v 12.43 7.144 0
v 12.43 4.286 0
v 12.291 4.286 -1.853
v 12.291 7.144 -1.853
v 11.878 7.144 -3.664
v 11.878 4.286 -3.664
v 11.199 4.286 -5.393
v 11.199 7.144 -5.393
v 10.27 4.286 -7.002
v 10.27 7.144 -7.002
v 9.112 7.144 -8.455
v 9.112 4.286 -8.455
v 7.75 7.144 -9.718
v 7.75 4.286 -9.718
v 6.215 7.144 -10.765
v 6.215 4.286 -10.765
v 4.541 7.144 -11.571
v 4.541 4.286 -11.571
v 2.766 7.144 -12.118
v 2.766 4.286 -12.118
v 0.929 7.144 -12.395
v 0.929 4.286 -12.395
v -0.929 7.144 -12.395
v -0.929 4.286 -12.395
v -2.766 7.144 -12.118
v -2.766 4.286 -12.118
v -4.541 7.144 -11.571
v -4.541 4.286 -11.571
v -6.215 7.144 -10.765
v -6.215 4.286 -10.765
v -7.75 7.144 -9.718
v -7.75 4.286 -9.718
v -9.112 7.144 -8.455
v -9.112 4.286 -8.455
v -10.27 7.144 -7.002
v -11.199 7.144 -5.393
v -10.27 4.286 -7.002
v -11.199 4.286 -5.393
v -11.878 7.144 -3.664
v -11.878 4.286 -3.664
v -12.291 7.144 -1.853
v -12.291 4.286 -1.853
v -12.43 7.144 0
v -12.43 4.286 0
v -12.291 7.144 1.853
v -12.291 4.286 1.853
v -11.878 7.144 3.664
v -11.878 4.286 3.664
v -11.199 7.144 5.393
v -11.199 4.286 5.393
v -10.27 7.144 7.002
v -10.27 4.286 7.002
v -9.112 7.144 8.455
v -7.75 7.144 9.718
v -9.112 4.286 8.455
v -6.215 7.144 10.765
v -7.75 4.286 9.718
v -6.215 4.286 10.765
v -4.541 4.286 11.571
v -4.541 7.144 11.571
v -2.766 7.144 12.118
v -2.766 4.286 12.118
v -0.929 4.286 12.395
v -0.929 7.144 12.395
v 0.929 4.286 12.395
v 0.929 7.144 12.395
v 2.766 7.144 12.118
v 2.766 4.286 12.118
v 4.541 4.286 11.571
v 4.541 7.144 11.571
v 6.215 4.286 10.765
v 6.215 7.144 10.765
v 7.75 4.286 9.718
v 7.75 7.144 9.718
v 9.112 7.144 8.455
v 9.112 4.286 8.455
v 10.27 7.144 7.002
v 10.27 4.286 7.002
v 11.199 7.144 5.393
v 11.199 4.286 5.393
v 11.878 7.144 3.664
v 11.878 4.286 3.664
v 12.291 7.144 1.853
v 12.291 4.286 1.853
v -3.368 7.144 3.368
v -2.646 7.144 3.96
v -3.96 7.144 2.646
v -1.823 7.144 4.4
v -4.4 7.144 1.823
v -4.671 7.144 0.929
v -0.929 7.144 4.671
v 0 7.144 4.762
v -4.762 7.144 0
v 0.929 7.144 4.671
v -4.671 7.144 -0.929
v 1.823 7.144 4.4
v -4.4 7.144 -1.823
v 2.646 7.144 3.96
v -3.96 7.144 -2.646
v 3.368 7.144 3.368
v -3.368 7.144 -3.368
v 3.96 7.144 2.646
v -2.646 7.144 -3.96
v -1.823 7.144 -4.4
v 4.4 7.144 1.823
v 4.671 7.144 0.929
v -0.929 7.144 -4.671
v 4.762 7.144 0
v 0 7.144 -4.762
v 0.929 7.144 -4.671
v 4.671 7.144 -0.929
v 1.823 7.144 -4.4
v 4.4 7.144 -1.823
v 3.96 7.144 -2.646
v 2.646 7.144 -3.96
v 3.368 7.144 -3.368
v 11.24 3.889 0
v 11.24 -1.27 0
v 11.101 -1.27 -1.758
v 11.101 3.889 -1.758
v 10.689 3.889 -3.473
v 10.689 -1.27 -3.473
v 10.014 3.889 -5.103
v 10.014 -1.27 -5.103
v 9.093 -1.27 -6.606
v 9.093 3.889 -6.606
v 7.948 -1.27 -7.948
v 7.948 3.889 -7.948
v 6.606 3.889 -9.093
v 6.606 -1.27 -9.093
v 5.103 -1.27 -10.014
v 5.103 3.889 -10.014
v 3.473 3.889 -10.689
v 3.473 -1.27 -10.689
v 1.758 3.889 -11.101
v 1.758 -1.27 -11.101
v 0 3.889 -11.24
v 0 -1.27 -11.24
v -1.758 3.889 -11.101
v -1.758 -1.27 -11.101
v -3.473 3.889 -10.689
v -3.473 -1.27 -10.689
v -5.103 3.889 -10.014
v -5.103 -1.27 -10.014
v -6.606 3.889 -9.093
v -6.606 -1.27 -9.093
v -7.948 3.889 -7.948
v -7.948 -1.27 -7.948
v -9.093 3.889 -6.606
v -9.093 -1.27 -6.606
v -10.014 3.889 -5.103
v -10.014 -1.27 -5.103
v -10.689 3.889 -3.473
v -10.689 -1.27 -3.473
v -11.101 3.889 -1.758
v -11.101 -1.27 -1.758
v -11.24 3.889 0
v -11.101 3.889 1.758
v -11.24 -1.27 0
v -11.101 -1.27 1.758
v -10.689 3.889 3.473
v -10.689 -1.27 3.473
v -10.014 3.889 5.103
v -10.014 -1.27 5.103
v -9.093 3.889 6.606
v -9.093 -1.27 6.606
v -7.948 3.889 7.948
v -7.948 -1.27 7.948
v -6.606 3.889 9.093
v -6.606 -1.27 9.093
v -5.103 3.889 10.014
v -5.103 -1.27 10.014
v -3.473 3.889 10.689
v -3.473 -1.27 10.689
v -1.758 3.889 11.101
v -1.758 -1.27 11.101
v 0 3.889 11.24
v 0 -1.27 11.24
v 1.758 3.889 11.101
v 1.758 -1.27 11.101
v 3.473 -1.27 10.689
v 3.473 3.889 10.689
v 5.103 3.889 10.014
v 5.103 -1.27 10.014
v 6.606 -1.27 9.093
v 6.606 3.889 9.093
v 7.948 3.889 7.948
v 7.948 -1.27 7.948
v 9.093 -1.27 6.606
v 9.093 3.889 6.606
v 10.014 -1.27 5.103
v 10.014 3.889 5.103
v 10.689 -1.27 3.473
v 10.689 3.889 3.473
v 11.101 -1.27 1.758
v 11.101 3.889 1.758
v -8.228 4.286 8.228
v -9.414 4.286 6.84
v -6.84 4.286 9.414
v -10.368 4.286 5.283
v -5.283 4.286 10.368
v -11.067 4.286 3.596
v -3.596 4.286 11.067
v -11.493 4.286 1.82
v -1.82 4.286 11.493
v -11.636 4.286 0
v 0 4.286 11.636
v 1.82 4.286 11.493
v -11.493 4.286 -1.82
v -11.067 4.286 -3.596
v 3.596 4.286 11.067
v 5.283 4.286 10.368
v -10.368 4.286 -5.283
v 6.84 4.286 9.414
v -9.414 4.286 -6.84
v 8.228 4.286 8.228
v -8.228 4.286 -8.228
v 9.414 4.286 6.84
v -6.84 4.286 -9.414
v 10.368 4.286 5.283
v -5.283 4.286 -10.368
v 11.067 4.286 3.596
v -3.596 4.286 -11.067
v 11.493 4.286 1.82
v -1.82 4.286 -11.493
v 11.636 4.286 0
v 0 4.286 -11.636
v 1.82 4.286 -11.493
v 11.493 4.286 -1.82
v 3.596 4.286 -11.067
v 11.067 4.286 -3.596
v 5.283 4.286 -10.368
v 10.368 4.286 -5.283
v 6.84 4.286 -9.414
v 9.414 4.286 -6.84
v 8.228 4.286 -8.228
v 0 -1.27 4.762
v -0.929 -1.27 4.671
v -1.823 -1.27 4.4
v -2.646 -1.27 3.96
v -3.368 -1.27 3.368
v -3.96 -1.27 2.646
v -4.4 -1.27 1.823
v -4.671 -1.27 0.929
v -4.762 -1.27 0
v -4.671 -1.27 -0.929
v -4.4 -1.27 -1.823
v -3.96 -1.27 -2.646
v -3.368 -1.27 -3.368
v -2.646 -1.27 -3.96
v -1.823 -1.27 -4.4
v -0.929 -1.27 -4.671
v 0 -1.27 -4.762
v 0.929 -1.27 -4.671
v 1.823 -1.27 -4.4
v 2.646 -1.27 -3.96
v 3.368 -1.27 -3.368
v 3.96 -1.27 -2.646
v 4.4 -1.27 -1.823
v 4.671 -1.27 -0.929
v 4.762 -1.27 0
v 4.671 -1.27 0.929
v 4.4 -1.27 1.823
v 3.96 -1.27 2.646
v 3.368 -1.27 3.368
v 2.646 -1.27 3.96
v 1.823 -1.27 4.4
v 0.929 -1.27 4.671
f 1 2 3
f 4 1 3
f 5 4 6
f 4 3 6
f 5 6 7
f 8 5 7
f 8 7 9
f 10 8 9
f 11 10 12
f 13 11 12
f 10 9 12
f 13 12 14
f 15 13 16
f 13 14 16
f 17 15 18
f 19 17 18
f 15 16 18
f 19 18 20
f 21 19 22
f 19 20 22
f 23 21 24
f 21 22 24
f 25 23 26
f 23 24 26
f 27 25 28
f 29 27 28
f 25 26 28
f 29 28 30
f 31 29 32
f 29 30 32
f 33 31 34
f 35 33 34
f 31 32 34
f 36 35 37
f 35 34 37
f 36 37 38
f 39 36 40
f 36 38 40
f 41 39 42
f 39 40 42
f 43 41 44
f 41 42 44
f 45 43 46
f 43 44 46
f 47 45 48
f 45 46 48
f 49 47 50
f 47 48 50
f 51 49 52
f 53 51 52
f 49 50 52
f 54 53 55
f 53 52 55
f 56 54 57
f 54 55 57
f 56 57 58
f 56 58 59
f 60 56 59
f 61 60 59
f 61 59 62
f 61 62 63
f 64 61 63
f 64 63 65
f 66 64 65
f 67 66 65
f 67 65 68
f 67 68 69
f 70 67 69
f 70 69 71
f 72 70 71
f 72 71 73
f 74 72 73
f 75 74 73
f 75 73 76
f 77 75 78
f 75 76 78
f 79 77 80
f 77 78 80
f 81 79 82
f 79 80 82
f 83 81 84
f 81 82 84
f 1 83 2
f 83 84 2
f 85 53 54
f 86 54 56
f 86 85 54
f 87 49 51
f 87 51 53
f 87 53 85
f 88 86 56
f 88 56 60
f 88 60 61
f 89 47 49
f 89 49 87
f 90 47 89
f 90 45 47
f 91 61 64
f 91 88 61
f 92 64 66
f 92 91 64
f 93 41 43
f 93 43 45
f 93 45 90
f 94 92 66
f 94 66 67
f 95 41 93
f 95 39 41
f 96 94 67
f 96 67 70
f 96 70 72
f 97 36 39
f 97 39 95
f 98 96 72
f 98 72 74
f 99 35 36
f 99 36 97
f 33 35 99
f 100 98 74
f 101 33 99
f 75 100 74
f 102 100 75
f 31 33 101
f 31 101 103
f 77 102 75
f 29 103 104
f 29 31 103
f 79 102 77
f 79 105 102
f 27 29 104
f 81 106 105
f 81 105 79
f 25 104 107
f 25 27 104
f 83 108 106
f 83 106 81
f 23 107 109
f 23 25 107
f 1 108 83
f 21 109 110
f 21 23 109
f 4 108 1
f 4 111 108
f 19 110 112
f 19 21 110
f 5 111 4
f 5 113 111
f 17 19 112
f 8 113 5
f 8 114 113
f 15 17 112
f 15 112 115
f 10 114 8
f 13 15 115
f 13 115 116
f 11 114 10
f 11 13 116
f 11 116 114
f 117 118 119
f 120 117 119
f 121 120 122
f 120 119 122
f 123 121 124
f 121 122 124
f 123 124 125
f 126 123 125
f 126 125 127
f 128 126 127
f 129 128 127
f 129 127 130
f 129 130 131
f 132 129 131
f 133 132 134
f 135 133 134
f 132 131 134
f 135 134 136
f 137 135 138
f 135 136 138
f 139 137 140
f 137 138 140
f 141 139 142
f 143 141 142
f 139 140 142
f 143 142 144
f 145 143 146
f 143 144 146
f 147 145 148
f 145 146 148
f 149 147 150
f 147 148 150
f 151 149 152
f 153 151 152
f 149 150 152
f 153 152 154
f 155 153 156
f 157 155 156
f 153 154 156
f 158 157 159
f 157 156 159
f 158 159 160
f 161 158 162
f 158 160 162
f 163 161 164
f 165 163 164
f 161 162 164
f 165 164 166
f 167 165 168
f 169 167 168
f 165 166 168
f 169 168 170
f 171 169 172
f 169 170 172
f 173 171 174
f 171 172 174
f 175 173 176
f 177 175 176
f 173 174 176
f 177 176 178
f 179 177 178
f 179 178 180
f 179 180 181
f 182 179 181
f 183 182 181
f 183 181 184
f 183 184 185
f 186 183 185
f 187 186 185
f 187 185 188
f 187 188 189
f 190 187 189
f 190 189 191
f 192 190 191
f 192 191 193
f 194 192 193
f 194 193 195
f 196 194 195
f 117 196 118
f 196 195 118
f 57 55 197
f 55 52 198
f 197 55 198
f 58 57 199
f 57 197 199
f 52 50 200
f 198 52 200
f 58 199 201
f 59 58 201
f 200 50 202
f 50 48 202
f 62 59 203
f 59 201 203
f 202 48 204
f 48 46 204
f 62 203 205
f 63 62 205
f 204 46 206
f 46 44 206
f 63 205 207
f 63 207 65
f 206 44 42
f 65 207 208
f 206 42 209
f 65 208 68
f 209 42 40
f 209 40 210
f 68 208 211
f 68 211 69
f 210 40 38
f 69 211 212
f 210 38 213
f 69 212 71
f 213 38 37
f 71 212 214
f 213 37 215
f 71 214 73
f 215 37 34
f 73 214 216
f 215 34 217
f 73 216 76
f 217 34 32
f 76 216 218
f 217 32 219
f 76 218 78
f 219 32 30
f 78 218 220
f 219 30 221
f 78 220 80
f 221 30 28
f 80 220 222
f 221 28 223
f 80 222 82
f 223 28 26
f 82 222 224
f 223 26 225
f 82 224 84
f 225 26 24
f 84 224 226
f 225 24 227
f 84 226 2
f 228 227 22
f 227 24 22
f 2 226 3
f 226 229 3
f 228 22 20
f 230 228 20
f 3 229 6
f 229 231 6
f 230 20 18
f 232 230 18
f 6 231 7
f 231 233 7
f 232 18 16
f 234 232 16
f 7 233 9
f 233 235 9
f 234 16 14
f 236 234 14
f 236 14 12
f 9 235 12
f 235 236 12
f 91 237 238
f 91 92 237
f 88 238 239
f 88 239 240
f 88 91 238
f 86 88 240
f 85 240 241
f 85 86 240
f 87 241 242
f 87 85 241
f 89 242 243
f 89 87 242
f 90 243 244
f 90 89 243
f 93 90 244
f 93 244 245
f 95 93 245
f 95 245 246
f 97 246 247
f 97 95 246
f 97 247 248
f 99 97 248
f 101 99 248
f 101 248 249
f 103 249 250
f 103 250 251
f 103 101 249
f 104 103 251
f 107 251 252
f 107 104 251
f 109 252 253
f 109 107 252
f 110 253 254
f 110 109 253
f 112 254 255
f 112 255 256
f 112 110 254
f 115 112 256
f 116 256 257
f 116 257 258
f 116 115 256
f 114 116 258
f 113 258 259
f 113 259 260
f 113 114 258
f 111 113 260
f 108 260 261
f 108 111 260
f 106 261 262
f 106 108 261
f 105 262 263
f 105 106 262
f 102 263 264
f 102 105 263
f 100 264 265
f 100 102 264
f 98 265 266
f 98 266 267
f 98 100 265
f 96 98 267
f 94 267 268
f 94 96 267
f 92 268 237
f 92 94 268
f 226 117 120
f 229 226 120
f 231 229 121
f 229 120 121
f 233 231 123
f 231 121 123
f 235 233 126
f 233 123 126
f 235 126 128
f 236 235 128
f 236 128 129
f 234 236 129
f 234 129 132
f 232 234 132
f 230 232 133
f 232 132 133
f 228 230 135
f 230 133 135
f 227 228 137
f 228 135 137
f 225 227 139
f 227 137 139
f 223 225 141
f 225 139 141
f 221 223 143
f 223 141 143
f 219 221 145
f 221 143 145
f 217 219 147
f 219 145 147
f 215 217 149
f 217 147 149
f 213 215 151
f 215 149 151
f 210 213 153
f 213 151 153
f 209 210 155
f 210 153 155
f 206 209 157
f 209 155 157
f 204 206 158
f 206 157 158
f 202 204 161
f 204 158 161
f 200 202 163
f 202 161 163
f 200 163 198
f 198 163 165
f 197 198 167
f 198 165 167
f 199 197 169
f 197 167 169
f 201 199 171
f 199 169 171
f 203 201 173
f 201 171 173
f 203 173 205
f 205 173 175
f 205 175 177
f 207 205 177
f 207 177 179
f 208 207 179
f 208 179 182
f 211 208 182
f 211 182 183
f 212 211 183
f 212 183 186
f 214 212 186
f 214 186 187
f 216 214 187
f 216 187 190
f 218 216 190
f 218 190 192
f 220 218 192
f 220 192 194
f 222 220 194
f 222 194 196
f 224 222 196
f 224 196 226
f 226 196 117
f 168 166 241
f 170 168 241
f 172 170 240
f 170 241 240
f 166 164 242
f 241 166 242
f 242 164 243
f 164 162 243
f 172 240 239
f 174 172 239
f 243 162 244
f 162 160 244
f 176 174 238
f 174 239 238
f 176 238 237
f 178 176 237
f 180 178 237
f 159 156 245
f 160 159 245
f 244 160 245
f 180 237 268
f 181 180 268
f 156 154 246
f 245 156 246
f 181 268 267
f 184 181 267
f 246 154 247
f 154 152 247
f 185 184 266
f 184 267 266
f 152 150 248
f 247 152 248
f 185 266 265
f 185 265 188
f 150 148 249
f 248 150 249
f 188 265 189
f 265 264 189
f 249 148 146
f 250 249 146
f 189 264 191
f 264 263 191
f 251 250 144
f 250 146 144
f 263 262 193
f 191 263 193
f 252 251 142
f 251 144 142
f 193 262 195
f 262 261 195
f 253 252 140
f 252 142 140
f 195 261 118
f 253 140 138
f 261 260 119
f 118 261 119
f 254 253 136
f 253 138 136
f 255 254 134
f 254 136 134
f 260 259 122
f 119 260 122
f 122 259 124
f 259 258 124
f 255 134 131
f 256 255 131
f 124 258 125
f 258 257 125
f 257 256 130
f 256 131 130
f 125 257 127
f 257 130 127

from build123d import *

# Parameters (mm, degrees)
SKETCH2_R                = 11.1125
BOSS_EXTRUDE1_DEPTH      = 7.14375
SKETCH3_R                = 12.303125
BOSS_EXTRUDE2_DEPTH      = 1.5875
CUT_EXTRUDE2_DEPTH       = 19.808693033
CUT_EXTRUDE2_DEPTH_BACK  = 19.808693033
SKETCH4_R                = 4.7625
MOVE_FACE1_BY            = 1.27
MOVE_FACE1_2_BY          = 1.27
MOVE_START               = -1.27
MOVE_FACE2_OUTLINE_R     = 11.2395
MOVE_FACE2_OUTLINE_R_2   = 11.1125
MOVE_FACE2_DEPTH         = 5.55625
MOVE_START_2             = 4.28625
MOVE_FACE2_2_OUTLINE_R   = 12.430125
MOVE_FACE2_2_OUTLINE_R_2 = 12.303125
MOVE_FACE2_2_DEPTH       = 2.8575
CHAMFER1_SIZE            = 0.396875


# Read off the part's stored shape, not the designer's step: Move Face2
with BuildPart() as part:
    # Sketch2 → Boss-Extrude1 (new body)
    with BuildSketch(Plane(origin=(0, 0, 0), x_dir=(1, 0, 0), z_dir=(0, 1, 0))):
        with Locations(Location((0, 0, 0), (0, 0, 270))):
            Circle(SKETCH2_R)
    extrude(amount=BOSS_EXTRUDE1_DEPTH)

    # Sketch3 → Boss-Extrude2 (add)
    with BuildSketch(Plane(origin=(0, 7.14375, 0), x_dir=(1, 0, 0), z_dir=(0, 1, 0))):
        with Locations(Location((0, 0, 0), (0, 0, 270))):
            Circle(SKETCH3_R)
    extrude(amount=-BOSS_EXTRUDE2_DEPTH)

    # Sketch4 → Cut-Extrude2 (cut, two sides: drawn at the far end of the back side and taken through both)
    with BuildSketch(Plane(origin=(0, 0, 0), x_dir=(1, 0, 0), z_dir=(0, 1, 0)).offset(-CUT_EXTRUDE2_DEPTH_BACK)):
        with Locations(Location((0, 0, 0), (0, 0, 270))):
            Circle(SKETCH4_R)
    extrude(amount=CUT_EXTRUDE2_DEPTH + CUT_EXTRUDE2_DEPTH_BACK, mode=Mode.SUBTRACT)

    # Move Face1: a face moved outward by 1.27
    extrude(part.faces().sort_by_distance((-6.1515625, 5.55625, 9.8425))[0], amount=MOVE_FACE1_BY, dir=(0, -1, 0))

    # Move Face1 2: a face moved outward by 1.27
    extrude(part.faces().sort_by_distance((0, 0, 5.55625))[0], amount=MOVE_FACE1_2_BY, dir=(0, -1, 0))

    # Move Face2 outline → Move Face2 (add)
    with BuildSketch(Plane(origin=(0, 0, 0), x_dir=(1, 0, 0), z_dir=(0, 1, 0)).offset(MOVE_START)):
        Circle(MOVE_FACE2_OUTLINE_R)
        Circle(MOVE_FACE2_OUTLINE_R_2, mode=Mode.SUBTRACT)
    extrude(amount=MOVE_FACE2_DEPTH)

    # Move Face2 2 outline → Move Face2 2 (add)
    with BuildSketch(Plane(origin=(0, 0, 0), x_dir=(1, 0, 0), z_dir=(0, 1, 0)).offset(MOVE_START_2)):
        Circle(MOVE_FACE2_2_OUTLINE_R)
        Circle(MOVE_FACE2_2_OUTLINE_R_2, mode=Mode.SUBTRACT)
    extrude(amount=MOVE_FACE2_2_DEPTH)

    # Chamfer1
    chamfer1_edges = [part.edges().sort_by_distance(p)[0] for p in [
        (-11.2395, 4.28625, 0),
    ]]
    chamfer(chamfer1_edges, length=CHAMFER1_SIZE)


solid = part.part
